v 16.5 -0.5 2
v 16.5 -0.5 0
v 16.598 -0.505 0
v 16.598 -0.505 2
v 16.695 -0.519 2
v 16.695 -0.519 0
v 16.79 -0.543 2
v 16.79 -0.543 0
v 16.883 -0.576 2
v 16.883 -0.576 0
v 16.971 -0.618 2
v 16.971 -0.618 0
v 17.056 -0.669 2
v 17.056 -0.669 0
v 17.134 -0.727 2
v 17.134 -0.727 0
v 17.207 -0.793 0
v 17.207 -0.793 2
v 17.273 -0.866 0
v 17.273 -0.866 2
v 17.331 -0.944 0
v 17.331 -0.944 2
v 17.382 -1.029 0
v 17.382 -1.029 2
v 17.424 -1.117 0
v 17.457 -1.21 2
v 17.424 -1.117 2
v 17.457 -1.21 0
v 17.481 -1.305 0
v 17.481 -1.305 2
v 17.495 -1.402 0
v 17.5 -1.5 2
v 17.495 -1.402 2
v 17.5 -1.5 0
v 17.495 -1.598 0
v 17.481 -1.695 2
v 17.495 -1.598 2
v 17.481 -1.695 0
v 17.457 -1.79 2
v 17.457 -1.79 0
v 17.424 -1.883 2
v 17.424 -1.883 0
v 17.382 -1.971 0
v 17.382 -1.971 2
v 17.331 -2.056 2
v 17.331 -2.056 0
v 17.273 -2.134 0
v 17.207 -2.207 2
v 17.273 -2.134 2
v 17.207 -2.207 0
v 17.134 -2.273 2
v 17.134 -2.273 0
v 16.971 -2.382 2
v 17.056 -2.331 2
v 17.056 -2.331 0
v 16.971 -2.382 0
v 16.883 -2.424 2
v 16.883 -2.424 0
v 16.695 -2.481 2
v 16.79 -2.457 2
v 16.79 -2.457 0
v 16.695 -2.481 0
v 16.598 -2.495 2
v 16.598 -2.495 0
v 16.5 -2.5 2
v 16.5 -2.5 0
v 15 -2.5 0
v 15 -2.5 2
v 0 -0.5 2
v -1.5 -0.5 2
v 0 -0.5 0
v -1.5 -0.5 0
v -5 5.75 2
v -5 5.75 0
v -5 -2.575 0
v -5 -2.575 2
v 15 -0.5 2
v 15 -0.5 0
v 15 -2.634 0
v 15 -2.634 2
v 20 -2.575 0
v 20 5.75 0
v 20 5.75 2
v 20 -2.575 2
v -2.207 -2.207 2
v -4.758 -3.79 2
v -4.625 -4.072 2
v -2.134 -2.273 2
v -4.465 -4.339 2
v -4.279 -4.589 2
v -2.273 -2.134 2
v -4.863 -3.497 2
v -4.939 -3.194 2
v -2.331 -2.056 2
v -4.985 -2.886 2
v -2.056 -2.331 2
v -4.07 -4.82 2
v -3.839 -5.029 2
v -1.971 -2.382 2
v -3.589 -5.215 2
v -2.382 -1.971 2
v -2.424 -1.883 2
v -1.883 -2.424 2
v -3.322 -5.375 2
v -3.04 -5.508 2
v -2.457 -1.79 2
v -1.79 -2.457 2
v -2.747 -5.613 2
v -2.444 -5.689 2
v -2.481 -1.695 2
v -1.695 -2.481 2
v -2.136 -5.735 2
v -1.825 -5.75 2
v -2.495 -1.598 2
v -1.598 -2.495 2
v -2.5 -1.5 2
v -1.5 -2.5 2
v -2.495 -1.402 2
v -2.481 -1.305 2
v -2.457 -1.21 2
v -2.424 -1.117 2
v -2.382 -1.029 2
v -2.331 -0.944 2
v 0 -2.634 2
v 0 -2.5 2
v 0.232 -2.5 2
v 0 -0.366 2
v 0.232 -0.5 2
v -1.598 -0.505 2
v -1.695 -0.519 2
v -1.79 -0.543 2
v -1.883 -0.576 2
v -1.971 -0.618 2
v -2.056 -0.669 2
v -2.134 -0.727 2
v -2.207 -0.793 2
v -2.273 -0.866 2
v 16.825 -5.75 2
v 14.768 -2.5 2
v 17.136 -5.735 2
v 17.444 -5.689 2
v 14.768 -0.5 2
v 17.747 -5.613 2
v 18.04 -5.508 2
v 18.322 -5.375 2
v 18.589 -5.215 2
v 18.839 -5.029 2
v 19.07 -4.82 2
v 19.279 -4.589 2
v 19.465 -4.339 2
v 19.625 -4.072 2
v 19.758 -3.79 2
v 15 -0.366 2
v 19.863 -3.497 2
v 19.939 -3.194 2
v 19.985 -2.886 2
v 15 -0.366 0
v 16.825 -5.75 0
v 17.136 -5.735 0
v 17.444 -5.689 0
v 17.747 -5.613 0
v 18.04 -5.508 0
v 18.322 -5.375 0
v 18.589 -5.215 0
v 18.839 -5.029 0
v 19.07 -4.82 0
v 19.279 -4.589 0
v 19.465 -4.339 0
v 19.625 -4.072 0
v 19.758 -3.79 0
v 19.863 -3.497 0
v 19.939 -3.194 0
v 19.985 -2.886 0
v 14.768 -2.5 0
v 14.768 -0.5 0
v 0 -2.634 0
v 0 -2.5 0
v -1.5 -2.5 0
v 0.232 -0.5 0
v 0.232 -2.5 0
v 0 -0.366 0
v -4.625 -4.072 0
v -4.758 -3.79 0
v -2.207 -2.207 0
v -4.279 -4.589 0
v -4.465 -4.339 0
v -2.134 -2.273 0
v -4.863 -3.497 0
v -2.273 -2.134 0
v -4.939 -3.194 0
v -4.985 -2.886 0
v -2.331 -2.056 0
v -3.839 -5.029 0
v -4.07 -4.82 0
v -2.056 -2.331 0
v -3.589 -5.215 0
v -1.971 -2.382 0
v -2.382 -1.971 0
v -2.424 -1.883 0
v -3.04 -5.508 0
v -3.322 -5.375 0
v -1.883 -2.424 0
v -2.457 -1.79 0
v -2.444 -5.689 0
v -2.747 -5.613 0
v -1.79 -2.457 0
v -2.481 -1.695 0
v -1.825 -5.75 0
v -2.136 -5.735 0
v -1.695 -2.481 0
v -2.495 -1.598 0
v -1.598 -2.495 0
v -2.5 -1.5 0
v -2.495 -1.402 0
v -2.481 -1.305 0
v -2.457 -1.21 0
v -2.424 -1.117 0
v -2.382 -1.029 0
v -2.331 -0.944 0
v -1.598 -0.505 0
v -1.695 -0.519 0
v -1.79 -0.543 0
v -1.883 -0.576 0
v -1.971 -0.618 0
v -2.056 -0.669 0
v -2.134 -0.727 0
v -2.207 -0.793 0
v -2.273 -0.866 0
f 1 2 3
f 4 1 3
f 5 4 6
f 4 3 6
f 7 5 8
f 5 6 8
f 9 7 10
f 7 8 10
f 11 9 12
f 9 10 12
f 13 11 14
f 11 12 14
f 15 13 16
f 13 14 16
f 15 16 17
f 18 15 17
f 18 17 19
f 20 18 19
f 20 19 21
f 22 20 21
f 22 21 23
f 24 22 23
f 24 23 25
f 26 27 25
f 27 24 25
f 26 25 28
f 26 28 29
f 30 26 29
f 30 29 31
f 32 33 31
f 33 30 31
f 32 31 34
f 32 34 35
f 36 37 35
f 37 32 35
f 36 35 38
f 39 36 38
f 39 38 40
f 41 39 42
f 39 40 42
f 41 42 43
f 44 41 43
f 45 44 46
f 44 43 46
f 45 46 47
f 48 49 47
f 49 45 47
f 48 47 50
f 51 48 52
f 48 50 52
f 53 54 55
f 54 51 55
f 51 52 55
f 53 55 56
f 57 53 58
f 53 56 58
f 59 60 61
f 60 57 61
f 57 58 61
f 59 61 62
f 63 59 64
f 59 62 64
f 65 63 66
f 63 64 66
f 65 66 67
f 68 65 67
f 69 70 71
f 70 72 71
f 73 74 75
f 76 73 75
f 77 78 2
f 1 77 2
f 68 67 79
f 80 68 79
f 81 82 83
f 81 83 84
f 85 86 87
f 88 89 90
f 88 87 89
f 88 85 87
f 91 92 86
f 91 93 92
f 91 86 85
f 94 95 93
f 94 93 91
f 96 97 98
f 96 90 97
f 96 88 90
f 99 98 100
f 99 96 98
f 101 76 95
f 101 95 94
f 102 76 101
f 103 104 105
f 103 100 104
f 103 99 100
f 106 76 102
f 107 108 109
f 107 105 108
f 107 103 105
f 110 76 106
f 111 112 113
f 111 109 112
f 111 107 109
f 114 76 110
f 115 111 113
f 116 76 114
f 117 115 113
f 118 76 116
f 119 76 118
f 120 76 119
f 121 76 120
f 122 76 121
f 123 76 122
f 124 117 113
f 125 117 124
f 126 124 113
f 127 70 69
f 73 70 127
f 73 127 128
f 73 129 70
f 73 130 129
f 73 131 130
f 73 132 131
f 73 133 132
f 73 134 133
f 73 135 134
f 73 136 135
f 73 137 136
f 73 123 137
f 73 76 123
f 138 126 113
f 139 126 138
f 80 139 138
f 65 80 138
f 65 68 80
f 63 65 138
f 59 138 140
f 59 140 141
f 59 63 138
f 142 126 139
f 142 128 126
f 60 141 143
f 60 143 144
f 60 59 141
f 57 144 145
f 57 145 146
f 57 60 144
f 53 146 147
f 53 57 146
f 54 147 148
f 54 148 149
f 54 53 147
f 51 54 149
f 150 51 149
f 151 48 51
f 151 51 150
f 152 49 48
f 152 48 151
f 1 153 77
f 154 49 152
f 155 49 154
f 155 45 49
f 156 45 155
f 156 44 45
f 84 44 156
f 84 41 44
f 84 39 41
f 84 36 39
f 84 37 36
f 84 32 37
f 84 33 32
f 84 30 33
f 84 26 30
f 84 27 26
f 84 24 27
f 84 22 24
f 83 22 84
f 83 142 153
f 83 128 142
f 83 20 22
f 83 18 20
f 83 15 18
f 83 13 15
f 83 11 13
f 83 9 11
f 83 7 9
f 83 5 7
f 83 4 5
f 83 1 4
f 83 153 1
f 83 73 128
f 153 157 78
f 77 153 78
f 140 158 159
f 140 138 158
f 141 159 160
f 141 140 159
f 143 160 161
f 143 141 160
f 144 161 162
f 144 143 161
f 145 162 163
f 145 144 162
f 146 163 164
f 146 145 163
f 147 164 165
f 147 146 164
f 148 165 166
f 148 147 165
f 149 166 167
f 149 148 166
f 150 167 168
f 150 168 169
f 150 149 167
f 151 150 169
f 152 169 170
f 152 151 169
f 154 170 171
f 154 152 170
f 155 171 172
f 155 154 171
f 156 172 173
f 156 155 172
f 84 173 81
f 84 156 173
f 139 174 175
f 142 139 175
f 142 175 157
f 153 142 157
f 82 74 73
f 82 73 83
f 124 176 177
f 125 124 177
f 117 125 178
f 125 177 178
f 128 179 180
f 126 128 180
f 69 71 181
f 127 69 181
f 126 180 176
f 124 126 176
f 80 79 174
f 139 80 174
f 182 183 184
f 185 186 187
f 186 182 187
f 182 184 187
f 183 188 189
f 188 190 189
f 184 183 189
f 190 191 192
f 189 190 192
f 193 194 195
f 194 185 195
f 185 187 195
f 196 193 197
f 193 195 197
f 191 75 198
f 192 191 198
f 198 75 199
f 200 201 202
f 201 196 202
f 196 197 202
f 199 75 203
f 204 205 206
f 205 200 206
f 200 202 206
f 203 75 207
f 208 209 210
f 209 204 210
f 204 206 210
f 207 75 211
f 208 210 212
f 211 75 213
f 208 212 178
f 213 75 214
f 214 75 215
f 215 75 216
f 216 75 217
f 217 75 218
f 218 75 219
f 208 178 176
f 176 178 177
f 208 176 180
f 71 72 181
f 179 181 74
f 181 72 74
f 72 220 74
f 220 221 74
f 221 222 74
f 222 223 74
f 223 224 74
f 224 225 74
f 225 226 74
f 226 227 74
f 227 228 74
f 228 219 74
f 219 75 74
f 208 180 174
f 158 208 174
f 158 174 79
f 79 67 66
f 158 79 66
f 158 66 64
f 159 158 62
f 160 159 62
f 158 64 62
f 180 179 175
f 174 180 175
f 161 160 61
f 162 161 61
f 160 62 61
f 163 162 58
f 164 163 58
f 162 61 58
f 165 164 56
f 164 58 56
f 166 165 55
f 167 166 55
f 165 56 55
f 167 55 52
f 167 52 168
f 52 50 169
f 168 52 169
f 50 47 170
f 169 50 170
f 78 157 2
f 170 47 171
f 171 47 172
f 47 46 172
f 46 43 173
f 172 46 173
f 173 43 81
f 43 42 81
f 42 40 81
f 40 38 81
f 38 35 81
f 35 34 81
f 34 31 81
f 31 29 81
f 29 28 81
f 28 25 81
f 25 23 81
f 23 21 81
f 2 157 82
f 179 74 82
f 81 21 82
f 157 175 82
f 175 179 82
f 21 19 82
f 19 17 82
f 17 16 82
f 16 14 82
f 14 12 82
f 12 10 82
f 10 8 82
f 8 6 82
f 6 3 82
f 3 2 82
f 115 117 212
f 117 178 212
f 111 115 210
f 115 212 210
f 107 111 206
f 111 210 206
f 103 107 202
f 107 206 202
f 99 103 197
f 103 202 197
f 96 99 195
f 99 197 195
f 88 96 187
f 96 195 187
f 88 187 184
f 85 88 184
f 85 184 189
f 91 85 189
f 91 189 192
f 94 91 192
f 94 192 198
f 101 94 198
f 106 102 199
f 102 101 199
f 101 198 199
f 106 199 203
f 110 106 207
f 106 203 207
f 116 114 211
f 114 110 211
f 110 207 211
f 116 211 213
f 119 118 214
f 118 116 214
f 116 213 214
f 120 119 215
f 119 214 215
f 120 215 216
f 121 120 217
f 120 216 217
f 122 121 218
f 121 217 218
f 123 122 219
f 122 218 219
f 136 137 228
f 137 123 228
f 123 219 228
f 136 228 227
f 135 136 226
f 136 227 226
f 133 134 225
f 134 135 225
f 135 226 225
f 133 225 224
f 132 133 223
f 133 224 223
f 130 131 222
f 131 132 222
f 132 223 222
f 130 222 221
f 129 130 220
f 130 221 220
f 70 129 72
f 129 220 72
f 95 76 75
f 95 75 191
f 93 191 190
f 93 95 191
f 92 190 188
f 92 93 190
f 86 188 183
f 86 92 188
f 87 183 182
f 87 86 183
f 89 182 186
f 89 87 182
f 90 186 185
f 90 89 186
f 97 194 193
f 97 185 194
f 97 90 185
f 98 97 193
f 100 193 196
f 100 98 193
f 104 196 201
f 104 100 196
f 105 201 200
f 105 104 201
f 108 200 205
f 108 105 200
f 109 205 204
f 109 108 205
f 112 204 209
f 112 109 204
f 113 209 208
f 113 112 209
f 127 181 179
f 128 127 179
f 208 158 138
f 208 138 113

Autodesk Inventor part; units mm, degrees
ref_plane "YZ Plane" through (0, 0, 0) normal (1, 0, 0) x (0, 1, 0)
ref_plane "XZ Plane" through (0, 0, 0) normal (0, 1, 0) x (-1, 0, 0)
ref_plane "XY Plane" through (0, 0, 0) normal (0, 0, 1) x (1, 0, 0)
sketch "Sketch1" plane through (0, 0, 0) normal (0, 0, 1) x (1, 0, 0)
  line L0 (1.5, -5.75) -> (-1.9843, -5.75) projected
  line L1 (0, 0) -> (1.5, 0) projected
  line L2 (1.5, 0) -> (1.5, 5.75) projected
  line L3 (-16, 5.75) -> (1.5, 5.75) projected
  line L4 (-16, 3.21) -> (-16, 5.75) projected
  line L5 (0, 3.21) -> (-16, 3.21) projected
  line L6 (0, 2.75) -> (0, 3.21) projected
  line L7 (0, 2.75) -> (-1.9843, 2.75) projected
  arc A0 (-1.9843, 2.75) -> (-3.3072, 2.25) centre (-1.9843, 0.75) ccw projected
  arc A1 (-3.3072, 2.25) -> (-3.3072, -5.25) centre (0, -1.5) ccw projected
  arc A2 (-3.3072, -5.25) -> (-1.9843, -5.75) centre (-1.9843, -3.75) ccw projected
  line L8 (1.5, -5.75) -> (-1.9843, -5.75) projected
  line L9 (1.5, -5.75) -> (1.5, -3) projected
  line L10 (1.5, -3) -> (0, -3) projected
  line L11 (0, -3) -> (0, -2.5) projected
  line L12 (0, -2.5) -> (-1.5, -2.5) projected
  arc A3 (-1.5, -0.5) -> (-1.5, -2.5) centre (-1.5, -1.5) ccw projected
  line L13 (-1.5, -0.5) -> (0, -0.5) projected
  line L14 (0, -0.5) -> (0, 0) projected
  line L15 (15, -3) -> (13.5, -3) projected
  line L16 (13.5, -5.75) -> (13.5, -3) projected
  line L17 (13.5, -5.75) -> (16.9843, -5.75) projected
  arc A4 (16.9843, -5.75) -> (18.3072, -5.25) centre (16.9843, -3.75) ccw projected
  arc A5 (18.3072, -5.25) -> (18.3072, 2.25) centre (15, -1.5) ccw projected
  arc A6 (18.3072, 2.25) -> (16.9843, 2.75) centre (16.9843, 0.75) ccw projected
  line L18 (15, 2.75) -> (16.9843, 2.75) projected
  line L19 (15, 2.75) -> (15, 3.21) projected
  line L20 (31, 3.21) -> (15, 3.21) projected
  line L21 (31, 3.21) -> (31, 5.75) projected
  line L22 (13.5, 5.75) -> (31, 5.75) projected
  line L23 (13.5, 0) -> (13.5, 5.75) projected
  line L24 (13.5, 0) -> (15, 0) projected
  line L25 (15, 0) -> (15, -0.5) projected
  line L26 (15, -0.5) -> (16.5, -0.5) projected
  arc A7 (16.5, -2.5) -> (16.5, -0.5) centre (16.5, -1.5) ccw projected
  line L27 (16.5, -2.5) -> (15, -2.5) projected
  line L28 (15, -2.5) -> (15, -3) projected
  line L29 (14.7679, -0.5) -> (15, -0.366) projected
  line L30 (15, 0) -> (15, -0.366) projected
  line L31 (13.5, 0) -> (15, 0) projected
  line L32 (13.5, -3) -> (13.5, 0) projected
  line L33 (15, -3) -> (13.5, -3) projected
  line L34 (15, -2.634) -> (15, -3) projected
  line L35 (15, -2.634) -> (14.7679, -2.5) projected
  line L36 (14.7679, -2.5) -> (14.7679, -0.5) projected
  line L37 (0, -0.366) -> (0.2321, -0.5) projected
  line L38 (0.2321, -0.5) -> (0.2321, -2.5) projected
  line L39 (0.2321, -2.5) -> (0, -2.634) projected
  line L40 (0, -2.634) -> (0, -3) projected
  line L41 (0, -3) -> (1.5, -3) projected
  line L42 (1.5, 0) -> (1.5, -3) projected
  line L43 (1.5, 0) -> (0, 0) projected
  line L44 (0, 0) -> (0, -0.366) projected
  line L45 (20, -1.5) -> (20, -5.75)
  line L46 (13.5, -5.75) -> (20, -5.75)
  line L47 (13.5, -5.75) -> (-1.9843, -5.75)
  line L48 (-5, -1.5) -> (-5, -5.75)
  line L49 (-5, -5.75) -> (-1.9843, -5.75)
  line L50 (20, -5.75) -> (-5, -5.75)
  line L51 (-5, -5.75) -> (-5, 5.75)
  line L52 (-5, 5.75) -> (20, 5.75)
  line L53 (20, 5.75) -> (20, -5.75)
extrude "Extrusion1" add sketch "Sketch1" along normal blind 2 contours L0 A2 A1 A0 L7 L6 L5 L51 L3 L2 L1 L14 L13 A3 L12 L11 L10 L9 | L9 L42 L2 L52 L23 L32 L16 L47 | L49 L48 A1 A2 | L10 L11 L39 L38 L37 L14 L1 L42 | L16 L15 L28 L27 A7 L26 L25 L24 L23 L22 L53 L20 L19 L18 A6 A5 A4 L17 | L32 L24 L25 L29 L36 L35 L28 L15 | A4 A5 L45 L46 | L51 L5 L6 L7 A0 A1 | A5 A6 L18 L19 L20 L53
fillet "Fillet1" radius 3.175 2 edges at (-5, -5.75, 1) (20, -5.75, 1)
properties part number "N20Bracklet-Holder"
